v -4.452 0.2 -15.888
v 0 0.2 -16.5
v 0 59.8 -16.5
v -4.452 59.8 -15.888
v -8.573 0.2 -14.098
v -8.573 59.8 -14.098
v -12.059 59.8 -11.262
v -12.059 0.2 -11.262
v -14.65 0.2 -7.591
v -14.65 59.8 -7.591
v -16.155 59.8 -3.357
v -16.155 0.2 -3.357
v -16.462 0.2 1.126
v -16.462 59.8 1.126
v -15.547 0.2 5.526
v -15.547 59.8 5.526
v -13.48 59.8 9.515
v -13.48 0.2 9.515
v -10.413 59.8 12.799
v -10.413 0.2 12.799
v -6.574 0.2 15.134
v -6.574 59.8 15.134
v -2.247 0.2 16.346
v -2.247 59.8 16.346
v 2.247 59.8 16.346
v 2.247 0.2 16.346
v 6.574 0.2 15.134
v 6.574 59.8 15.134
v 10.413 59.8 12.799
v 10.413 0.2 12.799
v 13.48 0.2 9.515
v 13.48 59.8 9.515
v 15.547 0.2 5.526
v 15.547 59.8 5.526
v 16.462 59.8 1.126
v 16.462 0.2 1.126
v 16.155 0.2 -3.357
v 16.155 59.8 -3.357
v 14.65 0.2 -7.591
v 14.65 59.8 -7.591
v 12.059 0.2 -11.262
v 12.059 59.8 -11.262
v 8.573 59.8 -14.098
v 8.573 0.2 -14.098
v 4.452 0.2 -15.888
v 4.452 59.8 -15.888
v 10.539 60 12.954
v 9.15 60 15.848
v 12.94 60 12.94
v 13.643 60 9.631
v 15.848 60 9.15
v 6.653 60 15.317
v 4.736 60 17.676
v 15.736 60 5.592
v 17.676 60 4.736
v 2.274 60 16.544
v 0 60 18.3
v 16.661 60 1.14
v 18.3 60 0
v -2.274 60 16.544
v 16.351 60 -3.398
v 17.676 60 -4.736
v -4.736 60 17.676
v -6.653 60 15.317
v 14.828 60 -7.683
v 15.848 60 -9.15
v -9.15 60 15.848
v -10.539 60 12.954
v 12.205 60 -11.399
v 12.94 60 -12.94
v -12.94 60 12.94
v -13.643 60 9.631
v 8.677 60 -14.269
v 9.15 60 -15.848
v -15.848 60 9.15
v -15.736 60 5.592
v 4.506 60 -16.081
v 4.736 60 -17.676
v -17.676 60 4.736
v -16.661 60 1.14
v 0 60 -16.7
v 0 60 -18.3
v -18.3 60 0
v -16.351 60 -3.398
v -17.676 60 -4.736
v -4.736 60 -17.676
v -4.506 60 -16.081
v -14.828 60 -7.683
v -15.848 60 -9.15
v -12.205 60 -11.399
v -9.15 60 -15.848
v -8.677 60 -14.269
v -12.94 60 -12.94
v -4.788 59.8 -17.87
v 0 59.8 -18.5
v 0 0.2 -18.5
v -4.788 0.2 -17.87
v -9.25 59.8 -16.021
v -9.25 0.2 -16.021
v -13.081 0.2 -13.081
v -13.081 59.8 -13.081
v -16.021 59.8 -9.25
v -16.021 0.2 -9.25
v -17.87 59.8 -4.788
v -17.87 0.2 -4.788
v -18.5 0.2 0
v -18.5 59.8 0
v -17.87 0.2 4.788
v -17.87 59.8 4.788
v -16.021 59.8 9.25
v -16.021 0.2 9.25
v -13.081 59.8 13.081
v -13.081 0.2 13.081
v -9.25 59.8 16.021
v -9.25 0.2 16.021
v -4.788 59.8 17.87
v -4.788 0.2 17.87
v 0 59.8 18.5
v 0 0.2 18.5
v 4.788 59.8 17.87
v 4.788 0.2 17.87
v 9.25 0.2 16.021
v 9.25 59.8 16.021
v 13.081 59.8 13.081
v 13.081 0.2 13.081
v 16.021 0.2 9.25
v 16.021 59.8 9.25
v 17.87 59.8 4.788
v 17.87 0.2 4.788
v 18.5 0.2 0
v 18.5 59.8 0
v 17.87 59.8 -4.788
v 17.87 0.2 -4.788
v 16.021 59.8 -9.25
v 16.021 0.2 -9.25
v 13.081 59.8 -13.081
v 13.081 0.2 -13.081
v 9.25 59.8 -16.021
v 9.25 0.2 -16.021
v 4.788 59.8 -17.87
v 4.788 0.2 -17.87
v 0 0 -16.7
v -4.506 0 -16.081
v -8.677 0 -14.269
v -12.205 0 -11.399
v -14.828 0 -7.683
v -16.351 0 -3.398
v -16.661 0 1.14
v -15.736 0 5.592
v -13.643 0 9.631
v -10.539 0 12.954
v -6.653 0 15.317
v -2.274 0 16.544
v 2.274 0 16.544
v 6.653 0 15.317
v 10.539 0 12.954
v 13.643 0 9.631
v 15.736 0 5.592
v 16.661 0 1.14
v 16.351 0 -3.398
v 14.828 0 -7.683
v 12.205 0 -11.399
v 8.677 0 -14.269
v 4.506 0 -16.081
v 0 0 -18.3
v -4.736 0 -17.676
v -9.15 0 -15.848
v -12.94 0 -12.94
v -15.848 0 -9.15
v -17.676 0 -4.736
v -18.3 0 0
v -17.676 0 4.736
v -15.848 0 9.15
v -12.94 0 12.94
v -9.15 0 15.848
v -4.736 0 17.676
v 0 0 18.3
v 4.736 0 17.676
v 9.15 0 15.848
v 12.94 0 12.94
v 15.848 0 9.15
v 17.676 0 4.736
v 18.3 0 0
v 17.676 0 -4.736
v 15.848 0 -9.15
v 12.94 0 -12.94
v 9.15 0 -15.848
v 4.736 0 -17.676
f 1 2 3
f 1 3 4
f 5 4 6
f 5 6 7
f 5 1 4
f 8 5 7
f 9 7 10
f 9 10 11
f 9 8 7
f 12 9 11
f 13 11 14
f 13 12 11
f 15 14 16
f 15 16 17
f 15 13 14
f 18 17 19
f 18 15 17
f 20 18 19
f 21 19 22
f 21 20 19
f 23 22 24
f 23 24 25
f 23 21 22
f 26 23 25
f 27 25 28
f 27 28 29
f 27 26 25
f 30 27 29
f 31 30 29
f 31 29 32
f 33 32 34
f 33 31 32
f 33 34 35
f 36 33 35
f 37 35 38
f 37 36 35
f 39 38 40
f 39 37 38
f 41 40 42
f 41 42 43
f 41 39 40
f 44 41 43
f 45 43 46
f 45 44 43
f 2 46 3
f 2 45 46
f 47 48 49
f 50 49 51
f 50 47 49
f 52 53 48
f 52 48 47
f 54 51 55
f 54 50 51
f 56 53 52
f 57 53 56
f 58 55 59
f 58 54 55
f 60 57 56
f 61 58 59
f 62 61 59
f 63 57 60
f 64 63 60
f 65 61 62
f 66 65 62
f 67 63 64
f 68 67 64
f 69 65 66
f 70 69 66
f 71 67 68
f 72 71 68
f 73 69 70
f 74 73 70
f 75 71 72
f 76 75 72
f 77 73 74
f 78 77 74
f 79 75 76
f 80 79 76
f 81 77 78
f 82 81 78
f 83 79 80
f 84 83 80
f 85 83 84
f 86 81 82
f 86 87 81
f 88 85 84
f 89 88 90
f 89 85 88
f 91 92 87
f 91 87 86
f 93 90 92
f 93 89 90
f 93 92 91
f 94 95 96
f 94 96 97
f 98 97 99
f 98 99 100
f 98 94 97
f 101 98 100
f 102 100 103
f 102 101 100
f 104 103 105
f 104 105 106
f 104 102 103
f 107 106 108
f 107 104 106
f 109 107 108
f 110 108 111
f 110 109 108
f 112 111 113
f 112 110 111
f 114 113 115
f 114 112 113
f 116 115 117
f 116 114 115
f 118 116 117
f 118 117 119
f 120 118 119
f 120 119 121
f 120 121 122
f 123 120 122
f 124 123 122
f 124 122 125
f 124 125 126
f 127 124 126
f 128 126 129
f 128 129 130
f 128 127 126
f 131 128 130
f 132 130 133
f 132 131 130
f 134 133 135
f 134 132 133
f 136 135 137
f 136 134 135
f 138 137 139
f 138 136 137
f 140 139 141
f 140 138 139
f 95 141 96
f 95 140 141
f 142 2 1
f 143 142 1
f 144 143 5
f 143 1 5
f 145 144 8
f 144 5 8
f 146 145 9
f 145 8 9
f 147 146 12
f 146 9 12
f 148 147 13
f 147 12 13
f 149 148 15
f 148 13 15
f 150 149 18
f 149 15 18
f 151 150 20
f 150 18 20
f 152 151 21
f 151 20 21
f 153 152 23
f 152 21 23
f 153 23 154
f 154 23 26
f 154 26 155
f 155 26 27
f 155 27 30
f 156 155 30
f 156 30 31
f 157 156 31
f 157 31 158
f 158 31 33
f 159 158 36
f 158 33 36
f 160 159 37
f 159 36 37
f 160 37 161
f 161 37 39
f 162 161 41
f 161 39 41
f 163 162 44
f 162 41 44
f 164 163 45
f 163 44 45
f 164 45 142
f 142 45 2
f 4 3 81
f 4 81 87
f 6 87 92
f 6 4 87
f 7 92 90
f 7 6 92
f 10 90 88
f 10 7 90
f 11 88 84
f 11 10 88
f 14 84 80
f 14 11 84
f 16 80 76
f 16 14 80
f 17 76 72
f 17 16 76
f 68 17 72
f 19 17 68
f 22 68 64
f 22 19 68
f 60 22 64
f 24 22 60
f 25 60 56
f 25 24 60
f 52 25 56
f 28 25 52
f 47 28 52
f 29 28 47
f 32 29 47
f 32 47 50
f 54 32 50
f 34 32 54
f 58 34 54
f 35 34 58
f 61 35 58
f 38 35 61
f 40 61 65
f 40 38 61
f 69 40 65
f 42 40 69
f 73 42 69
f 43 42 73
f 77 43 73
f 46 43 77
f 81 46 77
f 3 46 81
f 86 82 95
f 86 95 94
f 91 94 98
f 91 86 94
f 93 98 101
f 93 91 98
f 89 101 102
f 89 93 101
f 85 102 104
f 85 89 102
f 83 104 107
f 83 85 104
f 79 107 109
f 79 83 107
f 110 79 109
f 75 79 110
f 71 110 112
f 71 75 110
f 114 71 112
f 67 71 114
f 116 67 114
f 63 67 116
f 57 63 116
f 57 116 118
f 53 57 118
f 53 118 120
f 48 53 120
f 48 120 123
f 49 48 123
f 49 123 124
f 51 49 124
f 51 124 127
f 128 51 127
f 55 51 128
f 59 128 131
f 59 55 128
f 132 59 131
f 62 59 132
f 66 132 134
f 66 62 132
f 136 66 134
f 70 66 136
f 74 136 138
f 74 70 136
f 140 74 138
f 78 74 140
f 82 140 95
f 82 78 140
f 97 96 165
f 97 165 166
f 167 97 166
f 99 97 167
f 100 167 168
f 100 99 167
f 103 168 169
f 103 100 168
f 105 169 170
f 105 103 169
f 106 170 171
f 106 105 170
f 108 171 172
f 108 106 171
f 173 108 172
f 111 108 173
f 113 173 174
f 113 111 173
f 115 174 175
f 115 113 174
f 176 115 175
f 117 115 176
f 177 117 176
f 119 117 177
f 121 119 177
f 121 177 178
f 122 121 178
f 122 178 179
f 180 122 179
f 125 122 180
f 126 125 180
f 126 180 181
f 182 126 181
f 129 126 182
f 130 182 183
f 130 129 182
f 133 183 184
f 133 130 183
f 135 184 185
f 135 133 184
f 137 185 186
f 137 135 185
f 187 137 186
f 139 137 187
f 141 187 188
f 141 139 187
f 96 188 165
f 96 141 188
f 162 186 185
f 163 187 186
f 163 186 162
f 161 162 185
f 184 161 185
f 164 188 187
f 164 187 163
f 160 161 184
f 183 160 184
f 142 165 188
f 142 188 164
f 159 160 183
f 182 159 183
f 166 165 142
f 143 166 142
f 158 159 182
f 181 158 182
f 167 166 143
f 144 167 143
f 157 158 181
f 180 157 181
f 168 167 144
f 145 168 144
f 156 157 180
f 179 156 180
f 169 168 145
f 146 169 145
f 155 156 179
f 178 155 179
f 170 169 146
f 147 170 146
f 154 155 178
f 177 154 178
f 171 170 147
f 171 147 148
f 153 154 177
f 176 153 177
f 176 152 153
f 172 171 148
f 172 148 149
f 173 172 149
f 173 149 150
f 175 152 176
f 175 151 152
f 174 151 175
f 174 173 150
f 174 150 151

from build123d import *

# Parameters (mm, degrees)
CHAMFER1_SIZE = 0.2


with BuildPart() as part:
    # Sketch1 → Revolve1 (revolve)
    with BuildSketch(Plane.XY, mode=Mode.PRIVATE) as revolve1_sk:
        Polygon((16.5, 0), (18.5, 0), (18.5, 4), (18.5, 56), (18.5, 60), (16.5, 60), (16.5, 56), (16.5, 4), align=None)
    revolve(revolve1_sk.sketch.rotate(Axis((0, 0, 0), (0, 1, 0)), 90), axis=Axis((0, 0, 0), (0, 1, 0)))

    # Chamfer1
    chamfer1_edges = [part.edges().sort_by_distance(p)[0] for p in [
        (0, 0, 16.5),
        (0, 60, 16.5),
        (0, 60, 18.5),
        (0, 0, 18.5),
    ]]
    chamfer(chamfer1_edges, length=CHAMFER1_SIZE)


solid = part.part
